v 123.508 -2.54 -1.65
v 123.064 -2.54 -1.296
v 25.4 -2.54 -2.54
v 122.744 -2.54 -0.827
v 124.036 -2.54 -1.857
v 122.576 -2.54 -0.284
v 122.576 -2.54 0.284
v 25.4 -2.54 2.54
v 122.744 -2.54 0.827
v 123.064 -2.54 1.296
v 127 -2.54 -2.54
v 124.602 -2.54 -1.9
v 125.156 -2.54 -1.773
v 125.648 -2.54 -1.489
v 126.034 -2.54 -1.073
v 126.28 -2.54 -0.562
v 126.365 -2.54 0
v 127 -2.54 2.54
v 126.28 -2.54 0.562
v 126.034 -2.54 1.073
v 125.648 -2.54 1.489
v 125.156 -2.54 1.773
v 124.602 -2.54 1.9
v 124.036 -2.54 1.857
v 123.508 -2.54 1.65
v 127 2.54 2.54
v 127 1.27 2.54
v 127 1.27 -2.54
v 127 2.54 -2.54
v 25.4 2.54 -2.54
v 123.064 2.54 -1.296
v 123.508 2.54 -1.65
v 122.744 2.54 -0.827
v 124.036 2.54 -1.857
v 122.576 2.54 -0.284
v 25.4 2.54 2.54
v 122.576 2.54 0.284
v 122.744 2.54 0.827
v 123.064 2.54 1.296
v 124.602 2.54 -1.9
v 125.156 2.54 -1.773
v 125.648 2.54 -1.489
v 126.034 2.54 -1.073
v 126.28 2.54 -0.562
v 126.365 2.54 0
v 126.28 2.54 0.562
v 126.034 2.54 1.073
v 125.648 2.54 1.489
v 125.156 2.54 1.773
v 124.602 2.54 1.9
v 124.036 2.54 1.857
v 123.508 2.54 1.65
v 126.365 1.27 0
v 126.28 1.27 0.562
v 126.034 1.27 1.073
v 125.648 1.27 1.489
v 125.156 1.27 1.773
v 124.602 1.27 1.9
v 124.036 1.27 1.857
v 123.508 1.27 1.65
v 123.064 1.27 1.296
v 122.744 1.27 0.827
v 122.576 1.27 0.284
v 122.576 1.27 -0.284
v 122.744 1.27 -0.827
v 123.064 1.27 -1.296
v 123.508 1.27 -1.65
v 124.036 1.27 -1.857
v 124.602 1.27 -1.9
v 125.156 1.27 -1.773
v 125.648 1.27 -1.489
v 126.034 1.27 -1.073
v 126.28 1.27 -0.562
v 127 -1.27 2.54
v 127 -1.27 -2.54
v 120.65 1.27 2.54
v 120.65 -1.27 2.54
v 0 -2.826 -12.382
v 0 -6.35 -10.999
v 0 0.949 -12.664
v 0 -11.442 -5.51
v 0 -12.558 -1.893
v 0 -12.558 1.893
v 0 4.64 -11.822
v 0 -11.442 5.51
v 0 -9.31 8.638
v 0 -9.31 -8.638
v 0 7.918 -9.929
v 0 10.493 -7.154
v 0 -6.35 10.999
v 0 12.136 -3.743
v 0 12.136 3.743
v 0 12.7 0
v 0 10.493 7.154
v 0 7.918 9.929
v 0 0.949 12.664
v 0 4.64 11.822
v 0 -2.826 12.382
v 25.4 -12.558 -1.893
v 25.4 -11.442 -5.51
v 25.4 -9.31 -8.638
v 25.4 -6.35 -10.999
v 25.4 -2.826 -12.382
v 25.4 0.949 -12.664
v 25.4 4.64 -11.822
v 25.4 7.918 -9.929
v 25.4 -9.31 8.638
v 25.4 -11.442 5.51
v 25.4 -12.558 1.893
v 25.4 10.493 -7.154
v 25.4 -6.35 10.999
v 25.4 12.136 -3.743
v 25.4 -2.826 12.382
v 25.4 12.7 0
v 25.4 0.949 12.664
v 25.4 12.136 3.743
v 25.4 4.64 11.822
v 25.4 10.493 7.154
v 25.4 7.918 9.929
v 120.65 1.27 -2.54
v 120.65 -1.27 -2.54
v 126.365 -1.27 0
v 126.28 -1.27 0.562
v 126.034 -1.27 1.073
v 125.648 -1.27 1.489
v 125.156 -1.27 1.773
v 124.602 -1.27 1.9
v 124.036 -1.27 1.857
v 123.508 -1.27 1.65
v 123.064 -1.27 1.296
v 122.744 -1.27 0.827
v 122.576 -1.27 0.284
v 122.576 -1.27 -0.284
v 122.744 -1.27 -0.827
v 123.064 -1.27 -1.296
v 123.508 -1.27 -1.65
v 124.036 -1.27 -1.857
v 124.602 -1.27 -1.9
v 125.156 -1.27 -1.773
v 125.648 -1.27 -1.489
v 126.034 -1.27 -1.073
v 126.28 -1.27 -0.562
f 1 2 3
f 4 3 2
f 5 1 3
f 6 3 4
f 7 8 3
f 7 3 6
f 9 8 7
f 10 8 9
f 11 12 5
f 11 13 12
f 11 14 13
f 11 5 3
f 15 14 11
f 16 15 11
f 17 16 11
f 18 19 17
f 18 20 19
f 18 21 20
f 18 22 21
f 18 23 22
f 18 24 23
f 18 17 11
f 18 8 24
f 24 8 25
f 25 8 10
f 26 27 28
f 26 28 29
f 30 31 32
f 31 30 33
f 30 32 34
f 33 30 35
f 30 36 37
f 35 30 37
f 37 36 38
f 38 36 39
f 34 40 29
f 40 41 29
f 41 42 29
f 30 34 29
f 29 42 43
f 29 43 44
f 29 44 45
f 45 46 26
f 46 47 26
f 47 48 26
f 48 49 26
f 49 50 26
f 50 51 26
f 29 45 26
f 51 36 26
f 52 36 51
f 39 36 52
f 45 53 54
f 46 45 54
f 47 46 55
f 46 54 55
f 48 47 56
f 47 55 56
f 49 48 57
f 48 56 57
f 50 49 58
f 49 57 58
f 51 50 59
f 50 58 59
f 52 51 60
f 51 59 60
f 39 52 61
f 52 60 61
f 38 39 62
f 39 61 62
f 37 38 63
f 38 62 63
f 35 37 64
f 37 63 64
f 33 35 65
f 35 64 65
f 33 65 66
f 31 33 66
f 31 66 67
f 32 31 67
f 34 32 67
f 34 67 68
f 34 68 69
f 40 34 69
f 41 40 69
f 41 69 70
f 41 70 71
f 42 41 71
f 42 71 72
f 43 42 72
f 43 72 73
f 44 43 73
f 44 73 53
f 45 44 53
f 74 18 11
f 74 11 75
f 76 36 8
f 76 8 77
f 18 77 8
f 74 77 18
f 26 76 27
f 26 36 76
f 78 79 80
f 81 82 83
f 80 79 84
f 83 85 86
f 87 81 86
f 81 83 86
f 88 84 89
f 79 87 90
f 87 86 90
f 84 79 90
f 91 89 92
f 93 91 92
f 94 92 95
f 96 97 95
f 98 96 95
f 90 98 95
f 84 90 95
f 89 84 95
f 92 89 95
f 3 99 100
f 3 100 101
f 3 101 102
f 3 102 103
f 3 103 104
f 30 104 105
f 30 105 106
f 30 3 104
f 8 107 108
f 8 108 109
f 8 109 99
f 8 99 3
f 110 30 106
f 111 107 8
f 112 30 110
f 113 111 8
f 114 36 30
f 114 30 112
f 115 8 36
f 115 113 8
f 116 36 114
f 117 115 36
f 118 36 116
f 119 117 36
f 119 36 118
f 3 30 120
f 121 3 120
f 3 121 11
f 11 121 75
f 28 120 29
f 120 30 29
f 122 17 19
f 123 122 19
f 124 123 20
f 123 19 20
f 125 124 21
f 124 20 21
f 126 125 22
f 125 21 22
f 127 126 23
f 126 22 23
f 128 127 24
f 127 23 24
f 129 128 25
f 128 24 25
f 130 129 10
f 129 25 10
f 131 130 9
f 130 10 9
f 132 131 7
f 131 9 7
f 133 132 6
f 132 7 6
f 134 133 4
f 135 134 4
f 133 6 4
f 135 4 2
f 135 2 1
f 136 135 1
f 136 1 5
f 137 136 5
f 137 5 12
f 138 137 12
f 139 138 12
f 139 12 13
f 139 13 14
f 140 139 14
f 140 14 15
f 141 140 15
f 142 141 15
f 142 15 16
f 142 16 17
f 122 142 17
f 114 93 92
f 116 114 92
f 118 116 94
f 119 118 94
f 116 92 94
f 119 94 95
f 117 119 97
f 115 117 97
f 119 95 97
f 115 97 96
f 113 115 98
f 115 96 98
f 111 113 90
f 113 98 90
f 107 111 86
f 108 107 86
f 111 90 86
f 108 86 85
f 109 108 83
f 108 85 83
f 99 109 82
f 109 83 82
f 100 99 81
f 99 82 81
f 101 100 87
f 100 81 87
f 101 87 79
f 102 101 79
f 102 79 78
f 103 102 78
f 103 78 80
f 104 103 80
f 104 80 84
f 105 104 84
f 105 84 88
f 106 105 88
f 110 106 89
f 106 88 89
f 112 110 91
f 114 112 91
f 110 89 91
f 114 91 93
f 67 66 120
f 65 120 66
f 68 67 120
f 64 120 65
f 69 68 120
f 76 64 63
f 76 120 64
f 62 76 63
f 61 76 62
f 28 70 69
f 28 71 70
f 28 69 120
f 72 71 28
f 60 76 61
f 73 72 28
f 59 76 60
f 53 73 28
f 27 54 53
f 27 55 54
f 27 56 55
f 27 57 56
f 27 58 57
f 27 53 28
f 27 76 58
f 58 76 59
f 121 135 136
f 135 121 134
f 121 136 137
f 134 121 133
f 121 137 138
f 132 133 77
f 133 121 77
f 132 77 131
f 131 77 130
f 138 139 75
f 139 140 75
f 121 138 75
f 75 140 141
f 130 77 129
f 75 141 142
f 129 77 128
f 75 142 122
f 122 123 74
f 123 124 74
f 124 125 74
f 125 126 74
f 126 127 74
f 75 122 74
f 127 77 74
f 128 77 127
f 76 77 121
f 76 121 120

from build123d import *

# Parameters (mm, degrees)
F0_R     = 12.7
F1_DEPTH = 25.4
F2_W     = 101.6
F2_H     = 5.08
F3_DEPTH = 2.54
F4_R     = 1.905
F5_DEPTH = 15.241
F6_W     = 6.35
F6_H     = 2.54
F7_DEPTH = 15.241


with BuildPart() as f1:
    # F0 (on Right) → F1 (new body)
    with BuildSketch(Plane.YZ):
        Circle(F0_R)
    extrude(amount=F1_DEPTH)

    # F2 (on Top) → F3 (join, symmetric)
    with BuildSketch(Plane.XY):
        with Locations((76.2, 0)):
            Rectangle(F2_W, F2_H)
    extrude(amount=F3_DEPTH, both=True)

    # F4 (on face) → F5 (cut, through all)
    with BuildSketch(Plane.XZ.offset(2.54)):
        with Locations((124.46, 0)):
            Circle(F4_R)
    extrude(amount=-F5_DEPTH, mode=Mode.SUBTRACT)

    # F6 (on face) → F7 (cut, through all)
    with BuildSketch(Plane.XY.offset(2.54)):
        with Locations((123.825, 0)):
            Rectangle(F6_W, F6_H)
    extrude(amount=-F7_DEPTH, mode=Mode.SUBTRACT)


solid = f1.part
